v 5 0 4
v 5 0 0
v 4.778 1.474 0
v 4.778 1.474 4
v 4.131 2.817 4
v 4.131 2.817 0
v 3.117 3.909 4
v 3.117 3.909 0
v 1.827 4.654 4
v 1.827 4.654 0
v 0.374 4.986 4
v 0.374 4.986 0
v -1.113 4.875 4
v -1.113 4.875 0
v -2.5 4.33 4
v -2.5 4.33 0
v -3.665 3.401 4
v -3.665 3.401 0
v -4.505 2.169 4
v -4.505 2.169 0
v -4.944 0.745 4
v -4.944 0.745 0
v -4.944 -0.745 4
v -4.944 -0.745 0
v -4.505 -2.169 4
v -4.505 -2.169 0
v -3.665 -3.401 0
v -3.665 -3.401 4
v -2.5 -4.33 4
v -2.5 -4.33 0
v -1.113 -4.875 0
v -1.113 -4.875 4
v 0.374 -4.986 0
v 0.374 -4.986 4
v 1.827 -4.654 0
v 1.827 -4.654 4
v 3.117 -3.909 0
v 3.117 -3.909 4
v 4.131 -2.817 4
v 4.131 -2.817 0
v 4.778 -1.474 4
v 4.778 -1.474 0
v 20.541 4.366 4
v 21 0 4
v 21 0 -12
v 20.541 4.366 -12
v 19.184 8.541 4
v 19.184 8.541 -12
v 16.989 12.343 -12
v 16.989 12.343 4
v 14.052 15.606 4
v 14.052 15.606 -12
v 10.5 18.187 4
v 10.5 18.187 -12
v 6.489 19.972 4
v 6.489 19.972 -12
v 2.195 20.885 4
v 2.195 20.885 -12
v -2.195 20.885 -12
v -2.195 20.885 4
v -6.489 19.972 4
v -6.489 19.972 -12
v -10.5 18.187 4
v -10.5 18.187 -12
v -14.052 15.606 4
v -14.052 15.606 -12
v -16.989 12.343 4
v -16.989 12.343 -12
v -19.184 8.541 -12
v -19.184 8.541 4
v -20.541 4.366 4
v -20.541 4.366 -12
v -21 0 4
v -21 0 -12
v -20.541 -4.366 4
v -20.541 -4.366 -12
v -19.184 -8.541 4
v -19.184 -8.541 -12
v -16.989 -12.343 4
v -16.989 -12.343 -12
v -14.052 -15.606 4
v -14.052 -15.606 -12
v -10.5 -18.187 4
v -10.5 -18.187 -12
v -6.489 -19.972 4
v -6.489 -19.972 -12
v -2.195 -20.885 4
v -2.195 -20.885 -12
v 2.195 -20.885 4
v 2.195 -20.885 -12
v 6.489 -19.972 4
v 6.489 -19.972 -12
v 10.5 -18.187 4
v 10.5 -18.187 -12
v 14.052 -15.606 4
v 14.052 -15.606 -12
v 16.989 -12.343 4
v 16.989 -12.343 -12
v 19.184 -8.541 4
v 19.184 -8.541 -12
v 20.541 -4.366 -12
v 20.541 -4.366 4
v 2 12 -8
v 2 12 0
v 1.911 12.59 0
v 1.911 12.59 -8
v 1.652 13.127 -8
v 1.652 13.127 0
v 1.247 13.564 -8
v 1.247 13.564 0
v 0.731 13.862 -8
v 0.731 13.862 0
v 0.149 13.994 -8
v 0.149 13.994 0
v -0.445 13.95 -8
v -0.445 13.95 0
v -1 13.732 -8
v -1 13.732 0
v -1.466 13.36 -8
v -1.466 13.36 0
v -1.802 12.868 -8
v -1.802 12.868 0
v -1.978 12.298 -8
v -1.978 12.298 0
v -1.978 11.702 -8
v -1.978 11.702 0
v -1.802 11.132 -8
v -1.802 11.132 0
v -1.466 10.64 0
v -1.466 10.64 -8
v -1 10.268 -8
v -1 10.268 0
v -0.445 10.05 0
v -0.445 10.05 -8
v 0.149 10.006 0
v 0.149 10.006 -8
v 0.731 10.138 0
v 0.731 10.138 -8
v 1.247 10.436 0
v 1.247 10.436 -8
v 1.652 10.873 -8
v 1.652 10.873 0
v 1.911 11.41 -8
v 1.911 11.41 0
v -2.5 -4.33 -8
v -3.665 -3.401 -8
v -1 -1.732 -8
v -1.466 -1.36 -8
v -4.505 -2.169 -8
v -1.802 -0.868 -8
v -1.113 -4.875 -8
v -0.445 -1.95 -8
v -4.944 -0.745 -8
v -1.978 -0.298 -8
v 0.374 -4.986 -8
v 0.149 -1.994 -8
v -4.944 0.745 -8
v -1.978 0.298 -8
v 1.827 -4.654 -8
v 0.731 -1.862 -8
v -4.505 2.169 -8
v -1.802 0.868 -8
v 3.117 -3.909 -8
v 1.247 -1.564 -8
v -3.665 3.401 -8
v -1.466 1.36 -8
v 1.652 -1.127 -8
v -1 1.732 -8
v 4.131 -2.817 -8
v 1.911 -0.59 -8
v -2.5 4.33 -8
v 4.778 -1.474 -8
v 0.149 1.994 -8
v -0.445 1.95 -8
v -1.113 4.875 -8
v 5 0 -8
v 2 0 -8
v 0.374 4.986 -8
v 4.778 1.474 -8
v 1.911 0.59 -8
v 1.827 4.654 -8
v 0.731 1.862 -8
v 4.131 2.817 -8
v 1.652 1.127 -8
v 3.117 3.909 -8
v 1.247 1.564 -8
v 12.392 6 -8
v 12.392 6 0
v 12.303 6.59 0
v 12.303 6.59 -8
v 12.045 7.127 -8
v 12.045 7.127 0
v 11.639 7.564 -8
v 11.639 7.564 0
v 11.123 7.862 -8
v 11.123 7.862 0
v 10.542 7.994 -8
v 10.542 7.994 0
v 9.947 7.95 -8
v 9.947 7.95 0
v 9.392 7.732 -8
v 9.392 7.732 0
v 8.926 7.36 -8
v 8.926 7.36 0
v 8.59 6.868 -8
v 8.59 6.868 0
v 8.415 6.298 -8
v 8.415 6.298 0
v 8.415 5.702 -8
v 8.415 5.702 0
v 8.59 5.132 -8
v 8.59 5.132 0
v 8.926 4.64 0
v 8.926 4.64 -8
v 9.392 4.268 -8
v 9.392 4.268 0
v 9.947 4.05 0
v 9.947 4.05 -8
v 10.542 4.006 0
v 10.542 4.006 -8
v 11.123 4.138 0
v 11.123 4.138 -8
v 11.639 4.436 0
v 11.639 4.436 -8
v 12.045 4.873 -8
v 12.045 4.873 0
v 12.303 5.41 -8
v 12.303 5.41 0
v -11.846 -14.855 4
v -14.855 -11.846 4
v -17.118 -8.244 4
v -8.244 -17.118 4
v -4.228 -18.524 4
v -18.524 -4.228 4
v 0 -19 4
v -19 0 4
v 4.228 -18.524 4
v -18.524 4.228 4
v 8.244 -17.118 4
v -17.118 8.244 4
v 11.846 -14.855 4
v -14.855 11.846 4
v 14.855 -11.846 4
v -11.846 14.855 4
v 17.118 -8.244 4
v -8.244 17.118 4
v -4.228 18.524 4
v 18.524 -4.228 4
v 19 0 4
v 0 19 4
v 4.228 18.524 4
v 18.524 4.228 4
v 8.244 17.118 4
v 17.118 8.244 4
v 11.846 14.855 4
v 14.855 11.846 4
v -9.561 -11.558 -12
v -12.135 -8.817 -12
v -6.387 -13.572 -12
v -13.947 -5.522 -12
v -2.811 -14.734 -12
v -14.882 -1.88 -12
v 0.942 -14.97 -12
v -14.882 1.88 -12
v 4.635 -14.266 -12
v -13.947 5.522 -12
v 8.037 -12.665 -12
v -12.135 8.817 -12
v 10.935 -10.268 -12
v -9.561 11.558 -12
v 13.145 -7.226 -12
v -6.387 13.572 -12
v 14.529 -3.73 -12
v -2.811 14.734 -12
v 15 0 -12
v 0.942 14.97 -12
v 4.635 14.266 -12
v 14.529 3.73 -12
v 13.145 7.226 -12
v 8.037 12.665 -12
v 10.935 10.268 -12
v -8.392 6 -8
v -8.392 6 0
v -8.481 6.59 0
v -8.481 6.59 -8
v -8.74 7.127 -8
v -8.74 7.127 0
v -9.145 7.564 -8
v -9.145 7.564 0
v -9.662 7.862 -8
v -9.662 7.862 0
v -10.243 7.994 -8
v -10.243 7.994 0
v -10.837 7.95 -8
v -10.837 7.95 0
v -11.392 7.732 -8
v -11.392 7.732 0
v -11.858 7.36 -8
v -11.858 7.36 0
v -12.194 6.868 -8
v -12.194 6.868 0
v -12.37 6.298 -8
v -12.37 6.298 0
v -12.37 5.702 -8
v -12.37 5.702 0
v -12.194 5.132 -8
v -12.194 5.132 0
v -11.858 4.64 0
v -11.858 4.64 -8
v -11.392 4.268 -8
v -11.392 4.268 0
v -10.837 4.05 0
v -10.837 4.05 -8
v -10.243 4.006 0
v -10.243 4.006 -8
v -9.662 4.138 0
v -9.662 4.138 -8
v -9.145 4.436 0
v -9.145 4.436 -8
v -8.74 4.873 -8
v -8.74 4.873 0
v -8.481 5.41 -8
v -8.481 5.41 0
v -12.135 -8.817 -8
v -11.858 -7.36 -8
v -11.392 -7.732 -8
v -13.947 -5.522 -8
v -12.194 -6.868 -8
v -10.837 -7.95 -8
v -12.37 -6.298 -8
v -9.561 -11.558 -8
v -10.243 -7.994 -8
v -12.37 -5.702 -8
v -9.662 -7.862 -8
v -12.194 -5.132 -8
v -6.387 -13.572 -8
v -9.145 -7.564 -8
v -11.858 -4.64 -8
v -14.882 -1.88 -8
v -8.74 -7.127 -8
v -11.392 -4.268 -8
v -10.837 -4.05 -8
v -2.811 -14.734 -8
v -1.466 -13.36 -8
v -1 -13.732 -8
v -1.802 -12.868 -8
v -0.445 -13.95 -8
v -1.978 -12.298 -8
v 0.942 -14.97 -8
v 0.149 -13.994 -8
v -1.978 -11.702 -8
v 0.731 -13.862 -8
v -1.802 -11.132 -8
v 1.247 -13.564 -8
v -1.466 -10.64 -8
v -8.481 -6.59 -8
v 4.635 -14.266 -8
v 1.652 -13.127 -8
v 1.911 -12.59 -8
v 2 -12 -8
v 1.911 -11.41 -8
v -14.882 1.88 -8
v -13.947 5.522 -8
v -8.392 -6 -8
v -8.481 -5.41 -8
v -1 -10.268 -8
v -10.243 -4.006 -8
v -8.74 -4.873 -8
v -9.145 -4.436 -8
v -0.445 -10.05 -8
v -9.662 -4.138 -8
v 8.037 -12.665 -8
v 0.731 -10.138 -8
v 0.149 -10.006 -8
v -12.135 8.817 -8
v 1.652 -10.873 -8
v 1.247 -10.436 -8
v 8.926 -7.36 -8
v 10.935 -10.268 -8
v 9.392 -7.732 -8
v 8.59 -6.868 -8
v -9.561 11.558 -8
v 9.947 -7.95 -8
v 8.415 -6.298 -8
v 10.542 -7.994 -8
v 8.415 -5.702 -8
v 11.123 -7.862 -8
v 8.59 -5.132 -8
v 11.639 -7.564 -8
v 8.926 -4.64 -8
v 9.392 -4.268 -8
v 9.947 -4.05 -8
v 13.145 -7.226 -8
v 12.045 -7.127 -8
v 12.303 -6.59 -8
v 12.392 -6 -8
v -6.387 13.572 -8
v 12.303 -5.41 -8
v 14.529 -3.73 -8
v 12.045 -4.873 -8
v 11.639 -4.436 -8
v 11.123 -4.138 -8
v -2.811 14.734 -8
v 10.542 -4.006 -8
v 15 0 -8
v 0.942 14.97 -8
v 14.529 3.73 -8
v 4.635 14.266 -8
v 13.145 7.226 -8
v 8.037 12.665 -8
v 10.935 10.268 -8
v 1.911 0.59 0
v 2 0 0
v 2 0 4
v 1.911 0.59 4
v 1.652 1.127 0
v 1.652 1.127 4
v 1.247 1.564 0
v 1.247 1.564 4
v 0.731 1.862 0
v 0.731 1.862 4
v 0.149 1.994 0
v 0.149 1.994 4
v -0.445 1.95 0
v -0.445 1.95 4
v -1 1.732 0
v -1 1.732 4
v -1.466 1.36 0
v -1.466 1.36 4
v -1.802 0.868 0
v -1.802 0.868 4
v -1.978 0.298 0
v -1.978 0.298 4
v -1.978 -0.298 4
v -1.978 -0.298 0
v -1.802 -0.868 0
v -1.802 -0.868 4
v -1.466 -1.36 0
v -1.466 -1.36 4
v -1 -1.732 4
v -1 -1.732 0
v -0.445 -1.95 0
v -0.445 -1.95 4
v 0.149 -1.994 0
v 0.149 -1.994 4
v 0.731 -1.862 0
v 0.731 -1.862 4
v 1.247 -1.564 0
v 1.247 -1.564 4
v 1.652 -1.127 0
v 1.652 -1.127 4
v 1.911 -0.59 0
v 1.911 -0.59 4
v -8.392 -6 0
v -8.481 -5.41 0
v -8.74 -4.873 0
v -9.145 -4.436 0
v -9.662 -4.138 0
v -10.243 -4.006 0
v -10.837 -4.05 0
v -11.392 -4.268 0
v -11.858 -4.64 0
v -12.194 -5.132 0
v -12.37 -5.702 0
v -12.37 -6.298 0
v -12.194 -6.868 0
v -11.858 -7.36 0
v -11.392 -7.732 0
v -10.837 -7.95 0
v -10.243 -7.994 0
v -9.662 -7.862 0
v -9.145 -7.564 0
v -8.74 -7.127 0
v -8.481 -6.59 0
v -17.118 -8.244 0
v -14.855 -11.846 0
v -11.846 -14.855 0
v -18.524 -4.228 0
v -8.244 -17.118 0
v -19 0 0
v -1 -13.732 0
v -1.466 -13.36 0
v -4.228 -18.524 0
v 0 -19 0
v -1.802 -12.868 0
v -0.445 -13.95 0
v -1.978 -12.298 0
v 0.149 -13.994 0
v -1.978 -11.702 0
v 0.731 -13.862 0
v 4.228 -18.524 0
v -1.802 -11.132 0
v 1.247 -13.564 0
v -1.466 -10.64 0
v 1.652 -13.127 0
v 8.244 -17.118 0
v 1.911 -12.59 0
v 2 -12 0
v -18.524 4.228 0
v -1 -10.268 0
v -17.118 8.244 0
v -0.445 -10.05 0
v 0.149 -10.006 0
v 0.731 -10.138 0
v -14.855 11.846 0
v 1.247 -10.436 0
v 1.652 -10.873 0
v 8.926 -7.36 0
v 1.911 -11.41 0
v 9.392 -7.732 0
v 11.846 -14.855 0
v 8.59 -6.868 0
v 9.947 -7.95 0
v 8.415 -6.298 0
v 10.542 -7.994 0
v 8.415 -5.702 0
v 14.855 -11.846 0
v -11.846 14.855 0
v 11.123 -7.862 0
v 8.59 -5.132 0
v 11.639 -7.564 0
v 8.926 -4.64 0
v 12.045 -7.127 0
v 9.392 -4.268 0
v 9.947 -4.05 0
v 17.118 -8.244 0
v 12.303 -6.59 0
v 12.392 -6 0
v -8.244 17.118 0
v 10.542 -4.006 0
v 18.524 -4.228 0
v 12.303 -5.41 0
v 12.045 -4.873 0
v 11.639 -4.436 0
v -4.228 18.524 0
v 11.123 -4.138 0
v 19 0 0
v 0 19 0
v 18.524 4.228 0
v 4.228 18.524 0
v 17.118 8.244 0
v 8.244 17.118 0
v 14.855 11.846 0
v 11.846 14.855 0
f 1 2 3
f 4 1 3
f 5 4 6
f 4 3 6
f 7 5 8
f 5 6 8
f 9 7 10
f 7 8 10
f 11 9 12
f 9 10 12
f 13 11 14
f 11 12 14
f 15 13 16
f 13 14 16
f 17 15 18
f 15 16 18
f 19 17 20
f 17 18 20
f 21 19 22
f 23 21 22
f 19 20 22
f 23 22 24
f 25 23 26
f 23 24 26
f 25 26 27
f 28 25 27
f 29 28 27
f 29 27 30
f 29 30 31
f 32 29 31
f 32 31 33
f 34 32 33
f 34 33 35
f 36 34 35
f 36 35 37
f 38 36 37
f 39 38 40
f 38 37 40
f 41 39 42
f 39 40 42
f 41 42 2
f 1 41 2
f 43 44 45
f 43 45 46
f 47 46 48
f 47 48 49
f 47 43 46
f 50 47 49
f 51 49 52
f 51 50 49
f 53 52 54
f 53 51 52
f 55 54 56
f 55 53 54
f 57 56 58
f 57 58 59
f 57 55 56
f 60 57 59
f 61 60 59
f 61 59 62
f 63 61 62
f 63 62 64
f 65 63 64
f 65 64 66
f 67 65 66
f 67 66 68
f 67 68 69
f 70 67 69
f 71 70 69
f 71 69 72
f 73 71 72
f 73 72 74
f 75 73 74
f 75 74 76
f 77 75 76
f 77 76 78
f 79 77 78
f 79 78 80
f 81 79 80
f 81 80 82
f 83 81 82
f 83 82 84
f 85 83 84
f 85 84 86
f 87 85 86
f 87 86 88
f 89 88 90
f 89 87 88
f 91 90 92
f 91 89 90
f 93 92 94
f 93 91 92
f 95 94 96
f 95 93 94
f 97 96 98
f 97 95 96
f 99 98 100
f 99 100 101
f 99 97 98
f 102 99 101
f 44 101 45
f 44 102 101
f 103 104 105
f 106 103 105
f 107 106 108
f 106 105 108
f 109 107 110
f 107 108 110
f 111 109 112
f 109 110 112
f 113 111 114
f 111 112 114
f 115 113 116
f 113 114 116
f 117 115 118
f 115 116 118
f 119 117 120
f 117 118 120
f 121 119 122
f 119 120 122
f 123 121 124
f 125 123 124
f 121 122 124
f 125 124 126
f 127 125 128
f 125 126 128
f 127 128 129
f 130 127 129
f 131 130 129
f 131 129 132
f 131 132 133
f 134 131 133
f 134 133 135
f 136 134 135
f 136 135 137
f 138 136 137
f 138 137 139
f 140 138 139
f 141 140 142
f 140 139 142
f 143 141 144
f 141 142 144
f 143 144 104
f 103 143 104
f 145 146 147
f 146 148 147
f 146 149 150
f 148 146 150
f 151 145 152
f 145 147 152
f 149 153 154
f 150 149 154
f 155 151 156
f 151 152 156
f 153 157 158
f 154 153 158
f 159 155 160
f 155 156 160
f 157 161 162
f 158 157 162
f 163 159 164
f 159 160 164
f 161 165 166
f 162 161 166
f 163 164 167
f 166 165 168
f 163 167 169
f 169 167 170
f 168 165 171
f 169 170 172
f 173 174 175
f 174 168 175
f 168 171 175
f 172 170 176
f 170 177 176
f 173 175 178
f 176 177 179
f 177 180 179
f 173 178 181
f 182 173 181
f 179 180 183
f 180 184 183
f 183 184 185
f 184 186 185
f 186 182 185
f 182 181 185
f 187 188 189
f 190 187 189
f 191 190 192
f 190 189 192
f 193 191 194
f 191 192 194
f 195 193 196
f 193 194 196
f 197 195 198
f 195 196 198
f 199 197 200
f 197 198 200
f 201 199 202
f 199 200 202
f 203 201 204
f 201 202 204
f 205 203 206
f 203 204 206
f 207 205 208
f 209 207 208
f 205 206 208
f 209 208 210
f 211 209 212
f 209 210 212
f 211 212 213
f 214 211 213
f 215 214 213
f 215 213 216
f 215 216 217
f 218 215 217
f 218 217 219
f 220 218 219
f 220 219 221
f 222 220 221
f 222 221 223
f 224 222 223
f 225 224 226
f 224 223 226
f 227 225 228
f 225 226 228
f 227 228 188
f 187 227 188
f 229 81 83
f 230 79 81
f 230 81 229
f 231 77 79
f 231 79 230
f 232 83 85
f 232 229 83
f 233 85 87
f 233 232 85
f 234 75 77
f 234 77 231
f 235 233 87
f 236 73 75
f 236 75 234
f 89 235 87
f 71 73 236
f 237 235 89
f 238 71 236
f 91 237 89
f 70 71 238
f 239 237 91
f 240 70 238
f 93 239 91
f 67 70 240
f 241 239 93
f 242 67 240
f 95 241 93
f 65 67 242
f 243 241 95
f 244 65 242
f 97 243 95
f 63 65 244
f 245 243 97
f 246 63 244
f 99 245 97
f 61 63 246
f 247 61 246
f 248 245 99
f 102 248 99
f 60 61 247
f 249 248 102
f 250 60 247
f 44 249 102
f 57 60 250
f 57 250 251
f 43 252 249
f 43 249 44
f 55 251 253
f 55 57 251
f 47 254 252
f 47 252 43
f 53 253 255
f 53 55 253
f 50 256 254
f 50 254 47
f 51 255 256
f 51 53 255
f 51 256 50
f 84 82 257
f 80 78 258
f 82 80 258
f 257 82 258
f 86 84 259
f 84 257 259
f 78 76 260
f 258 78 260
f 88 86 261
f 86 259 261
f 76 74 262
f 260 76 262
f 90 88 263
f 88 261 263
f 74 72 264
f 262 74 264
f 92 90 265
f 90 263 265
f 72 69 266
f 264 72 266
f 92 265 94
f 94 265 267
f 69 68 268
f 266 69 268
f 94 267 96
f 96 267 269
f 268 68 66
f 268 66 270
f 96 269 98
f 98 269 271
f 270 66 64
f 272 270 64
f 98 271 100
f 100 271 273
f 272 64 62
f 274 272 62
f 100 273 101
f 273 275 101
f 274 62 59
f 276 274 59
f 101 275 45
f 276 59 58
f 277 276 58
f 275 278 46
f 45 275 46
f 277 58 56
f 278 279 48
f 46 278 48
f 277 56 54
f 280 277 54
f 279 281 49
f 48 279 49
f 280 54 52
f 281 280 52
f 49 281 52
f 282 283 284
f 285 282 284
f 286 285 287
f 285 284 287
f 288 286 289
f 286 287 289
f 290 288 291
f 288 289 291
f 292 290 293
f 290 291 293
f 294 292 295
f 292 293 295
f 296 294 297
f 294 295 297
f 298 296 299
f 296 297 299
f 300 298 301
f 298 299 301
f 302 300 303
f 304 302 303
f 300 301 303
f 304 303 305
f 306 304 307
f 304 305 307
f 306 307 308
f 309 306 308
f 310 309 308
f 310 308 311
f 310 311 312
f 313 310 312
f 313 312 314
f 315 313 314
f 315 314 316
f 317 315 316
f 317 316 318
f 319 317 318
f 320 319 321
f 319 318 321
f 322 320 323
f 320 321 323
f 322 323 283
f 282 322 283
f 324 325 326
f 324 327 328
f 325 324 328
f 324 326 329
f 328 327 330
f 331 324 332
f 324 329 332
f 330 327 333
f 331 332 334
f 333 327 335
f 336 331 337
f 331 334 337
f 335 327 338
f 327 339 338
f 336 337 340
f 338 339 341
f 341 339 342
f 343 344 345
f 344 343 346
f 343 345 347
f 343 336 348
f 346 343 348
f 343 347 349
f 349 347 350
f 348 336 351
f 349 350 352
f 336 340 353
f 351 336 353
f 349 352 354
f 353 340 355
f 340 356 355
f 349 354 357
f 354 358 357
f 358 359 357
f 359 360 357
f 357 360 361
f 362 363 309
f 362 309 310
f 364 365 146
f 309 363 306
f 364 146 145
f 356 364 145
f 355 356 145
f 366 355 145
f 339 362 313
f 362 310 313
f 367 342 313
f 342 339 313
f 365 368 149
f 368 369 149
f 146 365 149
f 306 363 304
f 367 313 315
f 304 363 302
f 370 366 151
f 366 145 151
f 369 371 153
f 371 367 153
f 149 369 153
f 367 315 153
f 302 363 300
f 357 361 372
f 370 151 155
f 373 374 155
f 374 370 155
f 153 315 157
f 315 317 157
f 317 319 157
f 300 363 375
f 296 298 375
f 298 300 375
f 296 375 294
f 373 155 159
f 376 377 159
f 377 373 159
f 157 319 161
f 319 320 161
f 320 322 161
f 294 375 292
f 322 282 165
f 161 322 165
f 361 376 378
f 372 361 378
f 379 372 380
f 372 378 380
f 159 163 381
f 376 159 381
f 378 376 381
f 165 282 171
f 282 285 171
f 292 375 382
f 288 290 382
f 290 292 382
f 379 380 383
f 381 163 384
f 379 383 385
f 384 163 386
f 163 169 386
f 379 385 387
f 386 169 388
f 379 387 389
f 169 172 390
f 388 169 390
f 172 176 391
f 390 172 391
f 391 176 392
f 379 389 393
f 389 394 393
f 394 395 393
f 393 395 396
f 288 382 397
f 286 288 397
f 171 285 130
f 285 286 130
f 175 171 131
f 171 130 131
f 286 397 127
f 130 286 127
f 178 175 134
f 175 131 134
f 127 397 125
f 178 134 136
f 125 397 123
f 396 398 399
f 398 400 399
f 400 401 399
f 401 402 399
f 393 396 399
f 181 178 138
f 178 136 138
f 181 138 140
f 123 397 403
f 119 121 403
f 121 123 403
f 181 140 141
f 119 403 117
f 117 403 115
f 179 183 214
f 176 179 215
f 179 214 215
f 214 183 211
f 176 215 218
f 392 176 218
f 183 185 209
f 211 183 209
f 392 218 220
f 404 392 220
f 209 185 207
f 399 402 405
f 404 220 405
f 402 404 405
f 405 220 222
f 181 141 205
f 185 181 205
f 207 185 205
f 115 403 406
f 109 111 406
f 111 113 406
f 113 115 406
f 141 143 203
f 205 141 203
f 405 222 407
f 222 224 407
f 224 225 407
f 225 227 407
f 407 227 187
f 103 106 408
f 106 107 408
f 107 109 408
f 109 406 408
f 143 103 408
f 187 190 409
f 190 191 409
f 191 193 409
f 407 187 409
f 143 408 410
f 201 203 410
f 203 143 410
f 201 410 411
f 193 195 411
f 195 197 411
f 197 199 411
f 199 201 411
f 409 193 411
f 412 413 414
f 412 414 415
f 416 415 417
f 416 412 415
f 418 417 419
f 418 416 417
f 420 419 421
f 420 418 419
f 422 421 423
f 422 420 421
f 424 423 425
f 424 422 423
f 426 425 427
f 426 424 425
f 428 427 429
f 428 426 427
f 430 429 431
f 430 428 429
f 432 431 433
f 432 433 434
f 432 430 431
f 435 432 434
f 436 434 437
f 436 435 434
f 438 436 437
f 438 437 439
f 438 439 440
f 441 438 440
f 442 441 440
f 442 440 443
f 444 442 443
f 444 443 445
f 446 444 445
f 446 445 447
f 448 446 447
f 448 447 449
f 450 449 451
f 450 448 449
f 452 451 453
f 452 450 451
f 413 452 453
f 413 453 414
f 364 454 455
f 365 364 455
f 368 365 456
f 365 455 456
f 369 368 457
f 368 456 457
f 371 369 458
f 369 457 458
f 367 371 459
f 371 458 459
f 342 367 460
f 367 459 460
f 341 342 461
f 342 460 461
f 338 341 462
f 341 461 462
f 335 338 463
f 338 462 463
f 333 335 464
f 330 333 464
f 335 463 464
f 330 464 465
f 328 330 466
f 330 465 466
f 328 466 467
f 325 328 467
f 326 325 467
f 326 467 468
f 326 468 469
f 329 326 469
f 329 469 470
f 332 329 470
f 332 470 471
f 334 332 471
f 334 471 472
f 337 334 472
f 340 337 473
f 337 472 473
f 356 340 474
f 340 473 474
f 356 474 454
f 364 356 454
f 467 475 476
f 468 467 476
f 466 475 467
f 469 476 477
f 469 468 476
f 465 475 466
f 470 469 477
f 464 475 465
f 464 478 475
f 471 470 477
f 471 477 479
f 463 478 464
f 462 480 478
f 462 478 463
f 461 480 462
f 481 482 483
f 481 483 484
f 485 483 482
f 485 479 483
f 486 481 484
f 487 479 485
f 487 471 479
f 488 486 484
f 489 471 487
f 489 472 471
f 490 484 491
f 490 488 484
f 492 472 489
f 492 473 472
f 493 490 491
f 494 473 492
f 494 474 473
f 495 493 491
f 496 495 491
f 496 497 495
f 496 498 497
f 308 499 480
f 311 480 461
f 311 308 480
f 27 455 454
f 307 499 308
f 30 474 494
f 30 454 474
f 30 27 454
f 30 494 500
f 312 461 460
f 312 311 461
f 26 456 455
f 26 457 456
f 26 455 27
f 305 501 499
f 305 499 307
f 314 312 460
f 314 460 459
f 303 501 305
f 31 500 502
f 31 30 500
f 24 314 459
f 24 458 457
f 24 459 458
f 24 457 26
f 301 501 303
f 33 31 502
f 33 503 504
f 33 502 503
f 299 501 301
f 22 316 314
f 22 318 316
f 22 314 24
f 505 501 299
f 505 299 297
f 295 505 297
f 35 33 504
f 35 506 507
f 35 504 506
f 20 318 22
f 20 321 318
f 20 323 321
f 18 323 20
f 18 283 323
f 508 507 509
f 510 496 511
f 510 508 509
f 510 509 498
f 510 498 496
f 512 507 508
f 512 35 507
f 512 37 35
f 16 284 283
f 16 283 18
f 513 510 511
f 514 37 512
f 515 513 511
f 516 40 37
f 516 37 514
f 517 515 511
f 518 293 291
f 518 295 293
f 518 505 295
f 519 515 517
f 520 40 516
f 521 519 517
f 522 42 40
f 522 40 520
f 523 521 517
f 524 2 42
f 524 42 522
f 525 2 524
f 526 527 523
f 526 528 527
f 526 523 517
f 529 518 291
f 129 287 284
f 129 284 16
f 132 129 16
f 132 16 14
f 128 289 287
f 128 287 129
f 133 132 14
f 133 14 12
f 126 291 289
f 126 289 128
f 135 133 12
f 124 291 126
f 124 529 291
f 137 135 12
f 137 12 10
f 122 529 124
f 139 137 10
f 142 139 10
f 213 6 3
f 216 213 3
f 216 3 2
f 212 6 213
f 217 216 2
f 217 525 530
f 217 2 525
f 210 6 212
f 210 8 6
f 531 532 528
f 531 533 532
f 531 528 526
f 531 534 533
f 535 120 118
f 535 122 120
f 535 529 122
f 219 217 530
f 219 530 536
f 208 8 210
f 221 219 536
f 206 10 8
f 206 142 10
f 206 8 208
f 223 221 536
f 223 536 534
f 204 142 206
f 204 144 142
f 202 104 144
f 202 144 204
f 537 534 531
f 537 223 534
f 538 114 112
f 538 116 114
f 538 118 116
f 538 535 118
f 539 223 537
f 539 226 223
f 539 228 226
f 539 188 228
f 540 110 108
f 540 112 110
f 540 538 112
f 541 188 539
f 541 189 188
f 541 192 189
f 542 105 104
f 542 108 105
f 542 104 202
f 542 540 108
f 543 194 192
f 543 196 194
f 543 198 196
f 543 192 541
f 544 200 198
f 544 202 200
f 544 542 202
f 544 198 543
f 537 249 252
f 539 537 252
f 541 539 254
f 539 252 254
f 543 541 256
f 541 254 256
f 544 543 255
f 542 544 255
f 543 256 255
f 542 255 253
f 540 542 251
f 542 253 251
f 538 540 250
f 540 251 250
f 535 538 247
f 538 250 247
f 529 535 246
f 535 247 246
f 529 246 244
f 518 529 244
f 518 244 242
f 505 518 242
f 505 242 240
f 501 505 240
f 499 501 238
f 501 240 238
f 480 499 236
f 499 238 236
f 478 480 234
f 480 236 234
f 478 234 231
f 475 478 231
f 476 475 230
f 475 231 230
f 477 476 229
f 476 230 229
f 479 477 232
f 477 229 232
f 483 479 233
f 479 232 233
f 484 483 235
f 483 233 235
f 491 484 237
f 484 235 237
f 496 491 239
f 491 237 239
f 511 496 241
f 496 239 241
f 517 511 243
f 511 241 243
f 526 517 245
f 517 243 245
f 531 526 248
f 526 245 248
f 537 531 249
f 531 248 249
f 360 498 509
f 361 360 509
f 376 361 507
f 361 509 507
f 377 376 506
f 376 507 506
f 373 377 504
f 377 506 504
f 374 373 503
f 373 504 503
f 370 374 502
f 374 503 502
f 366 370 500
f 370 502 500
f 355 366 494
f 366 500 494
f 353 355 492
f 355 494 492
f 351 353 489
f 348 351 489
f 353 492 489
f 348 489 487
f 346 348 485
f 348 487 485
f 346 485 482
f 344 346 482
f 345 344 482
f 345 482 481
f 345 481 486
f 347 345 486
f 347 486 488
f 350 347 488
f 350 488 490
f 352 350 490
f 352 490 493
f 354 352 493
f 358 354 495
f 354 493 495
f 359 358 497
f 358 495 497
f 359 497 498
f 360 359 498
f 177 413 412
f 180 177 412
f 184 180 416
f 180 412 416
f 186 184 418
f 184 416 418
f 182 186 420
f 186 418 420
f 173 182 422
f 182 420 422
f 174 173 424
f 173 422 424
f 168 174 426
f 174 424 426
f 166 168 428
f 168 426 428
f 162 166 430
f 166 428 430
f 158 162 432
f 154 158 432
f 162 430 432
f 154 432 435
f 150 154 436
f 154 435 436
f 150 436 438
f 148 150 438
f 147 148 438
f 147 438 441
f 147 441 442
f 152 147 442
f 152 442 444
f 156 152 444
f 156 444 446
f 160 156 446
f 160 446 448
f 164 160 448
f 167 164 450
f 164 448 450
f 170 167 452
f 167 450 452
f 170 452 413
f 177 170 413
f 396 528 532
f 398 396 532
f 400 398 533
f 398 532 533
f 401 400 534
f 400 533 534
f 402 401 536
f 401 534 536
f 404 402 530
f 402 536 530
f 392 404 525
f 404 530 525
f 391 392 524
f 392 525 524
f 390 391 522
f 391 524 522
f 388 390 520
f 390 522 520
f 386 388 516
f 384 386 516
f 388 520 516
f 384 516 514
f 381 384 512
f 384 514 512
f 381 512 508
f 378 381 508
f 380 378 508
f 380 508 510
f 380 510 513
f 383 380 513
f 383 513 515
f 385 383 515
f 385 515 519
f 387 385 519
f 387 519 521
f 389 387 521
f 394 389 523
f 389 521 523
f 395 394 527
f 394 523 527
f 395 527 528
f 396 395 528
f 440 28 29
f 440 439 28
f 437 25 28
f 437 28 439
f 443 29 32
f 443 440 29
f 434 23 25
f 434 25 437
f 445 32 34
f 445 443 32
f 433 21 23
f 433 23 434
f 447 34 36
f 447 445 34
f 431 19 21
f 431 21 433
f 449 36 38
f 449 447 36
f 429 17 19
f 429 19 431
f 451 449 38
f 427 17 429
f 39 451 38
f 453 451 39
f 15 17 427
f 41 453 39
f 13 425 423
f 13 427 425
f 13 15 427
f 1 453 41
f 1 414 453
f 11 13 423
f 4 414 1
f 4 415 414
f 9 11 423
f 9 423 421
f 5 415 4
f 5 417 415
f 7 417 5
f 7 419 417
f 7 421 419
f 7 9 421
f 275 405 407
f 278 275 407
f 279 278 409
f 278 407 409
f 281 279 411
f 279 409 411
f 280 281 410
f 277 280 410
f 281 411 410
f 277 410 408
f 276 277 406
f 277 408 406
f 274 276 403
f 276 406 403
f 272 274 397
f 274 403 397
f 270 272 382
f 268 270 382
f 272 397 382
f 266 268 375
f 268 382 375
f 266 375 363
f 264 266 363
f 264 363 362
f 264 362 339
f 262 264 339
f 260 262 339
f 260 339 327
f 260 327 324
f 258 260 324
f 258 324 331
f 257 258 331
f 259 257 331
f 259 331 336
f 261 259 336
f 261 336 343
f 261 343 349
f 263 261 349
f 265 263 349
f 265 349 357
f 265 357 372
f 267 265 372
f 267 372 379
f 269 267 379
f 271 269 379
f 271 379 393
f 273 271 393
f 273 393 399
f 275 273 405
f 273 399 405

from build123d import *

# Parameters (mm, degrees)
SKETCH1_R           = 21
SKETCH1_R_2         = 5
SKETCH1_R_3         = 2
BOSS_EXTRUDE1_DEPTH = 8
BOSS_EXTRUDE2_START = 4
SKETCH1_3_R         = 21
SKETCH1_3_R_2       = 19
BOSS_EXTRUDE2_DEPTH = 4
SKETCH1_4_R         = 21
SKETCH1_4_R_2       = 19
SKETCH1_4_R_3       = 15
BOSS_EXTRUDE3_DEPTH = 12
SKETCH1_6_R         = 5
SKETCH1_6_R_2       = 2
BOSS_EXTRUDE4_DEPTH = 4
BOSS_EXTRUDE5_START = 4
SKETCH1_7_R         = 5
SKETCH1_7_R_2       = 2
BOSS_EXTRUDE5_DEPTH = 4
SKETCH1_8_R         = 5
SKETCH1_8_R_2       = 2
BOSS_EXTRUDE6_DEPTH = 8


with BuildPart() as part:
    # Sketch1 → Boss-Extrude1 (new body)
    with BuildSketch(Plane.XY):
        Circle(SKETCH1_R)
        Circle(SKETCH1_R_2, mode=Mode.SUBTRACT)
        with Locations((0, 12)):
            Circle(SKETCH1_R_3, mode=Mode.SUBTRACT)
        with Locations((10.392304845, 6)):
            Circle(SKETCH1_R_3, mode=Mode.SUBTRACT)
        with Locations((10.392304845, -6)):
            Circle(SKETCH1_R_3, mode=Mode.SUBTRACT)
        with Locations((0, -12)):
            Circle(SKETCH1_R_3, mode=Mode.SUBTRACT)
        with Locations((-10.392304845, -6)):
            Circle(SKETCH1_R_3, mode=Mode.SUBTRACT)
        with Locations((-10.392304845, 6)):
            Circle(SKETCH1_R_3, mode=Mode.SUBTRACT)
    extrude(amount=-BOSS_EXTRUDE1_DEPTH)

    # Sketch1<3> → Boss-Extrude2 (add)
    with BuildSketch(Plane.XY.offset(BOSS_EXTRUDE2_START)):
        Circle(SKETCH1_3_R)
        Circle(SKETCH1_3_R_2, mode=Mode.SUBTRACT)
    extrude(amount=-BOSS_EXTRUDE2_DEPTH)

    # Sketch1<4> → Boss-Extrude3 (add)
    # profile 1 of 2: a face of its own
    with BuildSketch(Plane.XY):
        Circle(SKETCH1_4_R)
        Circle(SKETCH1_4_R_2, mode=Mode.SUBTRACT)
    # profile 2 of 2: a face of its own
    with BuildSketch(Plane.XY):
        Circle(SKETCH1_4_R_2)
        Circle(SKETCH1_4_R_3, mode=Mode.SUBTRACT)
    extrude(amount=-BOSS_EXTRUDE3_DEPTH)



with BuildPart() as body_2:
    # Sketch1<6> → Boss-Extrude4 (new body)
    with BuildSketch(Plane.XY):
        Circle(SKETCH1_6_R)
        Circle(SKETCH1_6_R_2, mode=Mode.SUBTRACT)
    extrude(amount=BOSS_EXTRUDE4_DEPTH)

    # Sketch1<7> → Boss-Extrude5 (add)
    with BuildSketch(Plane.XY.offset(BOSS_EXTRUDE5_START)):
        Circle(SKETCH1_7_R)
        Circle(SKETCH1_7_R_2, mode=Mode.SUBTRACT)
    extrude(amount=-BOSS_EXTRUDE5_DEPTH)


with BuildPart() as part_1:
    add(part.part)

    add(body_2.part)  # Boss-Extrude6 merges body 2
    # Sketch1<8> → Boss-Extrude6 (add)
    with BuildSketch(Plane.XY):
        Circle(SKETCH1_8_R)
        Circle(SKETCH1_8_R_2, mode=Mode.SUBTRACT)
    extrude(amount=-BOSS_EXTRUDE6_DEPTH)


solid = part_1.part
